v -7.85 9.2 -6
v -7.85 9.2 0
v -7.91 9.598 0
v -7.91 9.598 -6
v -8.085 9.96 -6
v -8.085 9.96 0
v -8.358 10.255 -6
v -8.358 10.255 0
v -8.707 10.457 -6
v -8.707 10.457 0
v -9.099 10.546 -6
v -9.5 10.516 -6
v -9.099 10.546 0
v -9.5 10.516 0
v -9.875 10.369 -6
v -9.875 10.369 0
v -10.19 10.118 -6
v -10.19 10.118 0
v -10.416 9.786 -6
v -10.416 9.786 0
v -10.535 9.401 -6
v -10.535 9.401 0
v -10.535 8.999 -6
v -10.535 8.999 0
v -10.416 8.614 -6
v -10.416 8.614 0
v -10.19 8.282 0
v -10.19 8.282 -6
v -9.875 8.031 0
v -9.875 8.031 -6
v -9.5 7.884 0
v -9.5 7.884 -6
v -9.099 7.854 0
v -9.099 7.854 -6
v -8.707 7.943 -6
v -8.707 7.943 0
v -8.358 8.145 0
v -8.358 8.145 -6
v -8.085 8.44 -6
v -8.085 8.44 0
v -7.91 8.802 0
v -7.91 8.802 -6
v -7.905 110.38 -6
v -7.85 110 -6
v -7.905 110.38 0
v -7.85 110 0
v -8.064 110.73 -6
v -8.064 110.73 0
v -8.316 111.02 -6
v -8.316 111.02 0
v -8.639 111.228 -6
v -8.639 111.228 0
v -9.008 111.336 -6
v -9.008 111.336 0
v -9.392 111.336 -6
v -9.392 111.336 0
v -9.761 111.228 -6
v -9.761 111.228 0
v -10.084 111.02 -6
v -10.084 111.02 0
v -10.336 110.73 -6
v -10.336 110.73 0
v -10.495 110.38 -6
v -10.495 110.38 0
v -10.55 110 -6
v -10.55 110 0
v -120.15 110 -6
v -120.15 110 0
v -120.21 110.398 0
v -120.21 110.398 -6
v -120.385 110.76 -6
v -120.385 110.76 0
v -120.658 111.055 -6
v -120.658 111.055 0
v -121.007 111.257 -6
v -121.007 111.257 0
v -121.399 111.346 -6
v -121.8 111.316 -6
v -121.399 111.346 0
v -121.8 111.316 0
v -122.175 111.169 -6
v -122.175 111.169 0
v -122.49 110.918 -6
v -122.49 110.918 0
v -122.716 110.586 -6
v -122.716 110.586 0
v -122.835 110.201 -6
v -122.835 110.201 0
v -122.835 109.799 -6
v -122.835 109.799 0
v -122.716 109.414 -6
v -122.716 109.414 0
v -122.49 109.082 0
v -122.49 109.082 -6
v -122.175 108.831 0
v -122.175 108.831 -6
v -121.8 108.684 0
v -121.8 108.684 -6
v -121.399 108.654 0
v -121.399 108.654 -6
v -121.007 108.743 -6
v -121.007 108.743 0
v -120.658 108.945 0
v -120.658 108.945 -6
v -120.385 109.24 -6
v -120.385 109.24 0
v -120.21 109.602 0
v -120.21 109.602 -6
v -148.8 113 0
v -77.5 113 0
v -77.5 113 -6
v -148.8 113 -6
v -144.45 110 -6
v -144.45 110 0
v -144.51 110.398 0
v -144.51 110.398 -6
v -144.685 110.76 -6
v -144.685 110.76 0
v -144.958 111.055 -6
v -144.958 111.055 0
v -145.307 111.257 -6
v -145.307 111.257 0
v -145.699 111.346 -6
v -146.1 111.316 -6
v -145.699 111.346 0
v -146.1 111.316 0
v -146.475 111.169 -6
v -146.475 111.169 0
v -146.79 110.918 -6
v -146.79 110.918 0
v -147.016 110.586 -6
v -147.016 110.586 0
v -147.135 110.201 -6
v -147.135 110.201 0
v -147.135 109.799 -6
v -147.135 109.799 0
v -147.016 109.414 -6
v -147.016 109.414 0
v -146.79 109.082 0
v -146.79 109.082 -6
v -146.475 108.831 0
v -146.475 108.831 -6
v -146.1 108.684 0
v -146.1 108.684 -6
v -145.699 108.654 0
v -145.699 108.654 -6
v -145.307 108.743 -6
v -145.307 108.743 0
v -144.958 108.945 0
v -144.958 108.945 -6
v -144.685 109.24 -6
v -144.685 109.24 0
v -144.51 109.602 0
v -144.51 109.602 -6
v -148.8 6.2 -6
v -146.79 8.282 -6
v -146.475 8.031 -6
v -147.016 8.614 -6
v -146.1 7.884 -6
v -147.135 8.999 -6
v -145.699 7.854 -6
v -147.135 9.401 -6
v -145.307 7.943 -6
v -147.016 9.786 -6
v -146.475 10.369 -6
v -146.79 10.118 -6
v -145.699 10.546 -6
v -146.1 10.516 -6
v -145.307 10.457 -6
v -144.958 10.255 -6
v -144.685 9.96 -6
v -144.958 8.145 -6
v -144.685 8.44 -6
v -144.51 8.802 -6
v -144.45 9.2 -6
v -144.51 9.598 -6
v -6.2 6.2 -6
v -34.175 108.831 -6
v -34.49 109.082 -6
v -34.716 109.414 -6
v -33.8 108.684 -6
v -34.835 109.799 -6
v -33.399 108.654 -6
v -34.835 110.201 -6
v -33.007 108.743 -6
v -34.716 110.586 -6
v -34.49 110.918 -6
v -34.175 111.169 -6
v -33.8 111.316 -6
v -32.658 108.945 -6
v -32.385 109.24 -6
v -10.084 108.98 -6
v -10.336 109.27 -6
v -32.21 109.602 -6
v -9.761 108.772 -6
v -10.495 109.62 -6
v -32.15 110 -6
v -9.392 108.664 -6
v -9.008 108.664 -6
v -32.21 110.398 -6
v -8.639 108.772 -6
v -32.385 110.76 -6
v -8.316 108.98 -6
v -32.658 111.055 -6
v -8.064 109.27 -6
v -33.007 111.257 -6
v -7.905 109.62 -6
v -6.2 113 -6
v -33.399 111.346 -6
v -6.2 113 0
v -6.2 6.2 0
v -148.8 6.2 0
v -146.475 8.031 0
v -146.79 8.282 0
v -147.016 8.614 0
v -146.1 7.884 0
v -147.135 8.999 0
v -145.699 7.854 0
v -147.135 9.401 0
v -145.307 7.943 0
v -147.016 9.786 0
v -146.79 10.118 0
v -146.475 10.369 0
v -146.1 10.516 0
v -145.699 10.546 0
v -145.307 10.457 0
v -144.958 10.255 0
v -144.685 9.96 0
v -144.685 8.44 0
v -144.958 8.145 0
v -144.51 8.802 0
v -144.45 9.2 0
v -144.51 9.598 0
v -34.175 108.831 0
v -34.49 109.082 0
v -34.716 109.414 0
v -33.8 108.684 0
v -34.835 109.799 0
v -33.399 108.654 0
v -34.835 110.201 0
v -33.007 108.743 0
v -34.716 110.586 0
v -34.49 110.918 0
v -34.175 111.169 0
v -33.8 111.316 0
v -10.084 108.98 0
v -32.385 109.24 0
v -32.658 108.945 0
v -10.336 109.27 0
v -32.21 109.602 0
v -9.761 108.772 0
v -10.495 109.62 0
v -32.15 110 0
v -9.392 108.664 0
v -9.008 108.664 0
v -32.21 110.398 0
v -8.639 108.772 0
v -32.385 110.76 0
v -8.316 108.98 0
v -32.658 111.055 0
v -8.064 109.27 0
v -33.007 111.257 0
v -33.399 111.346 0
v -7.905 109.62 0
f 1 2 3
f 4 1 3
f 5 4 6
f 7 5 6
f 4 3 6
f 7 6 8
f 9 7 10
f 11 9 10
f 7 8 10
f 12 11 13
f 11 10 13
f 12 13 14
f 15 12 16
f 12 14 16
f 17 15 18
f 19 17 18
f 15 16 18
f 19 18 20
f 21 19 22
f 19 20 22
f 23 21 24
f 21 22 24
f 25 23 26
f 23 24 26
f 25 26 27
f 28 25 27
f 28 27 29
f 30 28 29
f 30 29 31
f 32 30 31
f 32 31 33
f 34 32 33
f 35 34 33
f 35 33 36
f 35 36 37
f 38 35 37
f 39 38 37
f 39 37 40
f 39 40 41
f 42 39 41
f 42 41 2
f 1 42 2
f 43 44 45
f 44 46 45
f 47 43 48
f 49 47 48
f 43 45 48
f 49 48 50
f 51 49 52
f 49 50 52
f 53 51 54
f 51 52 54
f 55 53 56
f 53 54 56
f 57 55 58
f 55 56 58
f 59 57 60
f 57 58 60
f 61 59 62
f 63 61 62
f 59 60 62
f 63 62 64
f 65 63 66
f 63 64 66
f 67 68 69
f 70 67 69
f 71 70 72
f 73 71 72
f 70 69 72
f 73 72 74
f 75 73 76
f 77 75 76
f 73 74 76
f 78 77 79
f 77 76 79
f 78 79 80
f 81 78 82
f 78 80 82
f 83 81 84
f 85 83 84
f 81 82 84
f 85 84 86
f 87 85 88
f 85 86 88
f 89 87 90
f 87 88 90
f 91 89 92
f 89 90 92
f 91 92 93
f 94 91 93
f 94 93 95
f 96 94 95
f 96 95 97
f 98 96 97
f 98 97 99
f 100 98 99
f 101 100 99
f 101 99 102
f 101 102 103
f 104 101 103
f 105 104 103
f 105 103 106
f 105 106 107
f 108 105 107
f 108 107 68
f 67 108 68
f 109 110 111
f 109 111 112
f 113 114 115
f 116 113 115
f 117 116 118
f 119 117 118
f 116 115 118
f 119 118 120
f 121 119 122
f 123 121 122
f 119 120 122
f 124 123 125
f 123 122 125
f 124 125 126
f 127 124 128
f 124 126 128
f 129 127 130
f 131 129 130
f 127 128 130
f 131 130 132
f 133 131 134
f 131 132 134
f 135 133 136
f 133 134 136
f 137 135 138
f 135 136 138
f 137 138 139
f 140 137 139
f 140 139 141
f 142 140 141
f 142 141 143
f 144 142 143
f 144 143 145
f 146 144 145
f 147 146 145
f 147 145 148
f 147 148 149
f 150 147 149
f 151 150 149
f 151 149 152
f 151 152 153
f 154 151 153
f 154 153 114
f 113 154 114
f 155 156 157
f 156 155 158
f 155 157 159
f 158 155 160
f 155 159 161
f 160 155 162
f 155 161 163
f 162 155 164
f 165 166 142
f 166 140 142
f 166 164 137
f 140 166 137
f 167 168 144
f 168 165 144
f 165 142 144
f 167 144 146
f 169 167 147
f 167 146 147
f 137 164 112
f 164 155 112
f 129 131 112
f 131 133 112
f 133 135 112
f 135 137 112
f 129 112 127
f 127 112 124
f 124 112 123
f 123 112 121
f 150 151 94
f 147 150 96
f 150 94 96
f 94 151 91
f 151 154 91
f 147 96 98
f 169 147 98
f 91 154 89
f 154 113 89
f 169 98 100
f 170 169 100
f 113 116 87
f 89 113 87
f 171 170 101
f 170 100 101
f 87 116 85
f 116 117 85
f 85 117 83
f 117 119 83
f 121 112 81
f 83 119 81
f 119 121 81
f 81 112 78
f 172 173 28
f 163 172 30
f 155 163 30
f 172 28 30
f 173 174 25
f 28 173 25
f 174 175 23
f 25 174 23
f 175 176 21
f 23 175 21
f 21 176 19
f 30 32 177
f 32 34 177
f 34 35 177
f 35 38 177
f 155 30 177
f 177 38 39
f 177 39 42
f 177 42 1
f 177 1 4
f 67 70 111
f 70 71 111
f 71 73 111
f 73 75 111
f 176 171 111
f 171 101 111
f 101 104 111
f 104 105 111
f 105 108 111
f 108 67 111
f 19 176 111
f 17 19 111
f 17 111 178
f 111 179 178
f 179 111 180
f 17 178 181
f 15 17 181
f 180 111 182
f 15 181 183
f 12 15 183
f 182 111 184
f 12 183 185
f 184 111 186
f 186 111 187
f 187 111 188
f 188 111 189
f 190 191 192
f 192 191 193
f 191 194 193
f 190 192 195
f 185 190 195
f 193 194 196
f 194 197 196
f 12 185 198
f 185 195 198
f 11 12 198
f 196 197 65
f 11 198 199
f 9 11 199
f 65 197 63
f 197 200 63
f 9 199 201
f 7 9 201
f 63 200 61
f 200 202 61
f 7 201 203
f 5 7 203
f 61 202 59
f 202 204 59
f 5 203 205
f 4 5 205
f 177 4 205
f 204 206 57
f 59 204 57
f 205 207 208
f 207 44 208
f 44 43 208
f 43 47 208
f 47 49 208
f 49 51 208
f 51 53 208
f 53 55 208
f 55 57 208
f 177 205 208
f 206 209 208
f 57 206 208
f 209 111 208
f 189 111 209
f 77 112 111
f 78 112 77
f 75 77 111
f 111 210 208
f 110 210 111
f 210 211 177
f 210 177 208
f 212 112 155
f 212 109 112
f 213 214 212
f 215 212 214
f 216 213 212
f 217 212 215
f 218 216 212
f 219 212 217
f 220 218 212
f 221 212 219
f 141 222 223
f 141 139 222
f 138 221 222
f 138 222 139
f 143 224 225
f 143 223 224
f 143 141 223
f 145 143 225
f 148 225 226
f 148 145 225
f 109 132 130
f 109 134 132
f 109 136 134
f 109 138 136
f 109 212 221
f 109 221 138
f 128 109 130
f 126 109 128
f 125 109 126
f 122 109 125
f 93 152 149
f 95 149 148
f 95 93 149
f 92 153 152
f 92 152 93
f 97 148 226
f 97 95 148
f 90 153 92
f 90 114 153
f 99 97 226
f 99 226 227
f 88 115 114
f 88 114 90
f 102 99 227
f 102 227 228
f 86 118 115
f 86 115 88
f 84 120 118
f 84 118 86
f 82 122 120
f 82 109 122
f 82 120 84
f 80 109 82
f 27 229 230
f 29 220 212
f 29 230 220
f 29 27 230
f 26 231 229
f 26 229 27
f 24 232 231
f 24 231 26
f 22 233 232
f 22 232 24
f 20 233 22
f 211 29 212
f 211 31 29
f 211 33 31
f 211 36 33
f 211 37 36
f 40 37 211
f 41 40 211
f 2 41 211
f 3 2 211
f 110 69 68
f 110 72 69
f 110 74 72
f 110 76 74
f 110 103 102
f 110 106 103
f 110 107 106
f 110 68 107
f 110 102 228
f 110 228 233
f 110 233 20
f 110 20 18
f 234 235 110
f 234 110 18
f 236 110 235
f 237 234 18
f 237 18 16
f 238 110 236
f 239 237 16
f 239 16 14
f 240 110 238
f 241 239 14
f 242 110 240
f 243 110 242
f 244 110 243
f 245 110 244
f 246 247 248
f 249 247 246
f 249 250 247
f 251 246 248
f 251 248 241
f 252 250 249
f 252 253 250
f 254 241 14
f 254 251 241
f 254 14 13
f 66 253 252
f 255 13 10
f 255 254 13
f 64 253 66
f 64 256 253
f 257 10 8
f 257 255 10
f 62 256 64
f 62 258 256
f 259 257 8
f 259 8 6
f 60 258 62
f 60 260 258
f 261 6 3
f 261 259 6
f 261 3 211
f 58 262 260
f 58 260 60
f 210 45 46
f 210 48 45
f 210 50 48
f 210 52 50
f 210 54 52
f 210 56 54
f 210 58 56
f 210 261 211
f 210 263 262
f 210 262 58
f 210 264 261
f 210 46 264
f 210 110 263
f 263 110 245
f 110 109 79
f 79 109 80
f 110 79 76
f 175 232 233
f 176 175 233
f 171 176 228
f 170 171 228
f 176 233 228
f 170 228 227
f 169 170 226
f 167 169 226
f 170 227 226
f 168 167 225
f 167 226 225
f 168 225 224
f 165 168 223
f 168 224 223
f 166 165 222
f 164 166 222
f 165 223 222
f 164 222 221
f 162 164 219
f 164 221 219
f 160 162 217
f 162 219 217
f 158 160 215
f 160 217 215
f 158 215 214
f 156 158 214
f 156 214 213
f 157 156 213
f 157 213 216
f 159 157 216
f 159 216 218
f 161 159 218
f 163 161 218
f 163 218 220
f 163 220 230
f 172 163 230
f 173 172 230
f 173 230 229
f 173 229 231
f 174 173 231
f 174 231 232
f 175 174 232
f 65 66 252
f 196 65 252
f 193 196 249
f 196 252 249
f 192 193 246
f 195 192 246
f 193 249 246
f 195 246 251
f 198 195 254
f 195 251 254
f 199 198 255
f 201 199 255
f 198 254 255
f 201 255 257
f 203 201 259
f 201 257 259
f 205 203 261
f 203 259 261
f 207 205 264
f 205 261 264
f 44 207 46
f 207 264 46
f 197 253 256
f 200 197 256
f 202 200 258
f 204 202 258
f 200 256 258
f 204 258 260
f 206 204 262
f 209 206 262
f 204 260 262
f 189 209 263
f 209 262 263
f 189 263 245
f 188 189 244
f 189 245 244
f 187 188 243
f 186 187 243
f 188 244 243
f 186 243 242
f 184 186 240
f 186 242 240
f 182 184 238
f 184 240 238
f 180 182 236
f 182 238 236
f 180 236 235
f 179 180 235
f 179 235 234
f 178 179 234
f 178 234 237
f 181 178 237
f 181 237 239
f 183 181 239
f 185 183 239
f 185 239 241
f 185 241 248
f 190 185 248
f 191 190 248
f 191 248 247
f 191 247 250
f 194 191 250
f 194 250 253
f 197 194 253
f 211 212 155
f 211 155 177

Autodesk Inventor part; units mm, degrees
ref_plane "YZ Plane" through (0, 0, 0) normal (1, 0, 0) x (0, 1, 0)
ref_plane "XZ Plane" through (0, 0, 0) normal (0, 1, 0) x (-1, 0, 0)
ref_plane "XY Plane" through (0, 0, 0) normal (0, 0, 1) x (1, 0, 0)
sketch "스케치1" plane through (0, 0, 0) normal (0, 0, 1) x (1, 0, 0)
  line L0 (-155, 119.2) -> (0, 119.2) projected
  line L1 (-155, 0) -> (-155, 119.2) projected
  line L2 (0, 0) -> (-155, 0) projected
  line L3 (0, 119.2) -> (0, 0) projected
  line L4 (-6.2, 113) -> (-148.8, 113)
  line L5 (-148.8, 113) -> (-148.8, 6.2)
  line L6 (-148.8, 6.2) -> (-6.2, 6.2)
  line L7 (-6.2, 6.2) -> (-6.2, 113)
  circle A0 centre (-9.2, 110) radius 1.35 projected
  circle A1 centre (-145.8, 110) radius 1.35 projected
  circle A2 centre (-145.8, 9.2) radius 1.35 projected
  circle A3 centre (-9.2, 9.2) radius 1.35 projected
  line L8 (-9.2, 110) -> (-33.5, 110)
  circle A4 centre (-33.5, 110) radius 1.35
  line L9 (-77.5, 113) -> (-77.5, 108.65)
  circle A5 centre (-121.5, 110) radius 1.35
  point P0 (-6, 113.2)
  dimension "d3" = 24.3
  dimension "d4" = 2.7
extrude "돌출1" add sketch "스케치1" against normal blind 6 contours L7 L6 L5 L4
properties part number "chest_box_cap" material "PMMA 플라스틱"
